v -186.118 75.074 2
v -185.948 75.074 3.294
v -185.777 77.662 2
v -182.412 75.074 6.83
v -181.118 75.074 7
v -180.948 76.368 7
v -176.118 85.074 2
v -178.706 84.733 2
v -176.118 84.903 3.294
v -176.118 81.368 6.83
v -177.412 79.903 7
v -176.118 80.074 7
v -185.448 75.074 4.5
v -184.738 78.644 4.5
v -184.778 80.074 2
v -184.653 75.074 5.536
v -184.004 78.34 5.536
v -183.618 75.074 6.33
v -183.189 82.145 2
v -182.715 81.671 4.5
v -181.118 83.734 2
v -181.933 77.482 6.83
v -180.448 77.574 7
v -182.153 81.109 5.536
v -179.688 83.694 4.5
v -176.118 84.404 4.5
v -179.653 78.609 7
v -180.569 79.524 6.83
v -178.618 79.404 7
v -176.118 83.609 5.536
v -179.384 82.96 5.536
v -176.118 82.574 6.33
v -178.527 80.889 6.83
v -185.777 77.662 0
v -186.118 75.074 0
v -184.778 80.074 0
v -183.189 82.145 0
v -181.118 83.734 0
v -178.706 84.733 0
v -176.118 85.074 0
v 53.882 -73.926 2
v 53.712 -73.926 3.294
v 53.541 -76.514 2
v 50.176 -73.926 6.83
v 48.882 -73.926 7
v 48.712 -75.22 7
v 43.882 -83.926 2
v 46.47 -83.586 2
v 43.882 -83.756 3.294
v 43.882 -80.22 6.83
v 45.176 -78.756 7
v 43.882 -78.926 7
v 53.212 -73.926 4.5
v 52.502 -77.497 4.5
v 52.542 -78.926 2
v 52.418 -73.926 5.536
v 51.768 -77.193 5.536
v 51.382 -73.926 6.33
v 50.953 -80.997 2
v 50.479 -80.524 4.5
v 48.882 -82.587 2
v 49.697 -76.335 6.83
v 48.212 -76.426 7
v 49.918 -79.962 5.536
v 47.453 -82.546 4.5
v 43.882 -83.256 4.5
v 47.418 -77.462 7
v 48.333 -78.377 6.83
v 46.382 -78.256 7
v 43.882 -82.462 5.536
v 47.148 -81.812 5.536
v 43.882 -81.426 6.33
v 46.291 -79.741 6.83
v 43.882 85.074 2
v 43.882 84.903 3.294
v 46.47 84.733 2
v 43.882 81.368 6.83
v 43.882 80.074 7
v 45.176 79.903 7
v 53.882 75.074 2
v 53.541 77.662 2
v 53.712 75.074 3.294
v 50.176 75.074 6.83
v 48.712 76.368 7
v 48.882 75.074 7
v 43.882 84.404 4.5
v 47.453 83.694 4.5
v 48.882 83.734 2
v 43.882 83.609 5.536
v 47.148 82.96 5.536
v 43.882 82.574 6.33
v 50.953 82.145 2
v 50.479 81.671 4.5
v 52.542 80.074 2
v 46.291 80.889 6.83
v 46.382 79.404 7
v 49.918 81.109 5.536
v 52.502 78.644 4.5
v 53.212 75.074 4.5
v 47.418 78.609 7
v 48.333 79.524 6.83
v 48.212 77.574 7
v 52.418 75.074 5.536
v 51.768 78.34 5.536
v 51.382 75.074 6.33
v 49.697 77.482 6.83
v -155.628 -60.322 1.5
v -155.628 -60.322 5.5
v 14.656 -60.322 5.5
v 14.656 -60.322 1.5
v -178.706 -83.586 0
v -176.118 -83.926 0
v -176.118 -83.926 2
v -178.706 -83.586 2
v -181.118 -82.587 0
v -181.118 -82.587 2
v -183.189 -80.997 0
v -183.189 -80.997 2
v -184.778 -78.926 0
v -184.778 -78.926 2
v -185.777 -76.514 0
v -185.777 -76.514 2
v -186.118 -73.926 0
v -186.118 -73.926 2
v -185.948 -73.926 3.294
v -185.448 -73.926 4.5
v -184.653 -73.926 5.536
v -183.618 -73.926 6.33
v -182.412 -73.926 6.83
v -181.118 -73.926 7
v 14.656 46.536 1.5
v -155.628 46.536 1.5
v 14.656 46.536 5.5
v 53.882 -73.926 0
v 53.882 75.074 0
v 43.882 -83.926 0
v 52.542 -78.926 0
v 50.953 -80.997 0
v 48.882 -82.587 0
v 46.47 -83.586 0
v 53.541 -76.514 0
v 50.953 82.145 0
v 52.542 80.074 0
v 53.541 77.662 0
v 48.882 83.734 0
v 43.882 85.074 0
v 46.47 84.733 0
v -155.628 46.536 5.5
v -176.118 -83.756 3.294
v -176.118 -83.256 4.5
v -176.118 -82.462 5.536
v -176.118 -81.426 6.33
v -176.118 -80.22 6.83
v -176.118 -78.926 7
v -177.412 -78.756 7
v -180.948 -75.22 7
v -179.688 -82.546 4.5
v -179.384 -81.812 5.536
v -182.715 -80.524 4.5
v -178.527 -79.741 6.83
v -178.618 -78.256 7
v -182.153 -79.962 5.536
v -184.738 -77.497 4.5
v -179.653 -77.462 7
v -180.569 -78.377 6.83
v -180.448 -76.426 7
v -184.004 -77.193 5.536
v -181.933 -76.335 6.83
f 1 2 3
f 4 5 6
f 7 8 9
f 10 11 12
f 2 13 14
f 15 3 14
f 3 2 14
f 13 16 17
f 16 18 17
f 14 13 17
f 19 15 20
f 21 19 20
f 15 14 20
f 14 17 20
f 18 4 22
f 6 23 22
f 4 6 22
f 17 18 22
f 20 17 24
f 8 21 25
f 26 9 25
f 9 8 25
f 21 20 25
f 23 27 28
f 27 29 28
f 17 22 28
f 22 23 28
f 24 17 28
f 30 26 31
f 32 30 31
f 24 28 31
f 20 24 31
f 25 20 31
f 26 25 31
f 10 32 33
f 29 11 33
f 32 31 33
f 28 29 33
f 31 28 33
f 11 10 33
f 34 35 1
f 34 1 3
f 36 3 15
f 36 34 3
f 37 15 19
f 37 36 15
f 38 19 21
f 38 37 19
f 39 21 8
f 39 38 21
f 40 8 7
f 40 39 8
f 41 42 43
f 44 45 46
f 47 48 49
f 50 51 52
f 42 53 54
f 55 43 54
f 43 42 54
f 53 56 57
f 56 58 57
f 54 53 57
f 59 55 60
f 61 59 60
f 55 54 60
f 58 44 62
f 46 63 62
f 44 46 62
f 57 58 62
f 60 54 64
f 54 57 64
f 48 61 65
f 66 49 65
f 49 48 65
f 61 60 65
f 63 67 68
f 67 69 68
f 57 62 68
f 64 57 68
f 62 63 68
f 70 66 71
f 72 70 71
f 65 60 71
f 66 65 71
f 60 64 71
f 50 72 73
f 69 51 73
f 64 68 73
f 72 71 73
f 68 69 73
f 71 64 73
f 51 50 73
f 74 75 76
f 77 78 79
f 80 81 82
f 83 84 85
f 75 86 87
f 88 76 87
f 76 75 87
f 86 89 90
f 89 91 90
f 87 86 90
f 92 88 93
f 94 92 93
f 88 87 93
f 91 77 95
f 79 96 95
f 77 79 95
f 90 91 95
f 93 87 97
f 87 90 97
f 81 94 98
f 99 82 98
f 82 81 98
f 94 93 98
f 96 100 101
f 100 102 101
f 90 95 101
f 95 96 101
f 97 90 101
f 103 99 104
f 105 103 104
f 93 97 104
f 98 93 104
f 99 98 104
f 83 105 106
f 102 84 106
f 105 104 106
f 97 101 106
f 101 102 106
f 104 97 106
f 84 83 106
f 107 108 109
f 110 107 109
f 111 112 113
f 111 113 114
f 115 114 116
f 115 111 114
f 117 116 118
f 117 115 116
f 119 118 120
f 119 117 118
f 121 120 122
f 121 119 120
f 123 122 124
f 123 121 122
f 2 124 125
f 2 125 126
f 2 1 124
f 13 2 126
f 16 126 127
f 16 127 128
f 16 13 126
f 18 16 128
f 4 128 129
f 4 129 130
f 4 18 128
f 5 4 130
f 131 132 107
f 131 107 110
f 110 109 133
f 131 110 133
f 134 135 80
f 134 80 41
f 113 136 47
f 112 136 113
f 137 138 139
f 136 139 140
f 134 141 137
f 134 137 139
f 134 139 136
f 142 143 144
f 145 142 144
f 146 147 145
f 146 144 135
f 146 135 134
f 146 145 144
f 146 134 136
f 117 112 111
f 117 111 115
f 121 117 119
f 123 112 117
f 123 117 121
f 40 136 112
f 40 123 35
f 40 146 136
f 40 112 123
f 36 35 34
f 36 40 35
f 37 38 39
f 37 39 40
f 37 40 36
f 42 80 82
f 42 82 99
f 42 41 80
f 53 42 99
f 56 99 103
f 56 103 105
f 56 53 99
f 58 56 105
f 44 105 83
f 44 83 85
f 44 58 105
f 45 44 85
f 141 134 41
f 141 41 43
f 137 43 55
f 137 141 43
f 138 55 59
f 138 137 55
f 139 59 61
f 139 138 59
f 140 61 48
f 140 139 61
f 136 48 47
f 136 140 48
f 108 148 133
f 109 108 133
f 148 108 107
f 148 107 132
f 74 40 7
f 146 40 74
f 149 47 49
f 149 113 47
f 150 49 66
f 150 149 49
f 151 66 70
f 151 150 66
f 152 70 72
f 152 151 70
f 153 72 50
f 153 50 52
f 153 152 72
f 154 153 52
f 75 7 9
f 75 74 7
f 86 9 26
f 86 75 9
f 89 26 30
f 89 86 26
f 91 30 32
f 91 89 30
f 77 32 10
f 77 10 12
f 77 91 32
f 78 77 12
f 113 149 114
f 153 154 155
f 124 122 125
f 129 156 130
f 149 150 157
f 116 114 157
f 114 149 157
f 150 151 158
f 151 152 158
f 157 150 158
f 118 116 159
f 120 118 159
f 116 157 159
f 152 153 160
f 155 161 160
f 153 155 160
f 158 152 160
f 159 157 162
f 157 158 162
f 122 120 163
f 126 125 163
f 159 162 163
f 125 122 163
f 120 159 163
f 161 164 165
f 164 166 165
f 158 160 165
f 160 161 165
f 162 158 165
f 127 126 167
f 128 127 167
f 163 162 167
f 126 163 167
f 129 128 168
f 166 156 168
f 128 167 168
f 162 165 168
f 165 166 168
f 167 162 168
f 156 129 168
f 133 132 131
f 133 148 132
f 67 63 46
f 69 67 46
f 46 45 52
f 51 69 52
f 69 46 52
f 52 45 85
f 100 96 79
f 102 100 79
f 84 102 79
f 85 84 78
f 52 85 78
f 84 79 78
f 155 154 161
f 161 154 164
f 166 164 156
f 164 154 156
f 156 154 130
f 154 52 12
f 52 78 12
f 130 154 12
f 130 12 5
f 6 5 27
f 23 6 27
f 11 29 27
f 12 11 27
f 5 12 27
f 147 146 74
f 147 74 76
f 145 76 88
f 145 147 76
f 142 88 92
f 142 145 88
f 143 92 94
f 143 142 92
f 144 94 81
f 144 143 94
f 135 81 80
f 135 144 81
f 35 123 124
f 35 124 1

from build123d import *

# Parameters (mm, degrees)
BOSS_EXTRUDE1_DEPTH = 7
FILLET2_R           = 5
SKETCH2_W           = 170.284513749
SKETCH2_H           = 106.858227508
CUT_EXTRUDE1_DEPTH  = 2


with BuildPart() as part:
    # Sketch1 → Boss-Extrude1 (new body)
    with BuildSketch(Plane.XY):
        with BuildLine():
            Line((-176.117936118, 85.073710074), (43.882063882, 85.073710074))
            ThreePointArc((43.882063882, 85.073710074), (50.953131694, 82.144777886), (53.882063882, 75.073710074))
            Line((53.882063882, 75.073710074), (53.882063882, -73.926289926))
            ThreePointArc((53.882063882, -73.926289926), (50.953131694, -80.997357738), (43.882063882, -83.926289926))
            Line((43.882063882, -83.926289926), (-176.117936118, -83.926289926))
            ThreePointArc((-176.117936118, -83.926289926), (-183.18900393, -80.997357738), (-186.117936118, -73.926289926))
            Line((-186.117936118, -73.926289926), (-186.117936118, 75.073710074))
            ThreePointArc((-186.117936118, 75.073710074), (-183.18900393, 82.144777886), (-176.117936118, 85.073710074))
        make_face()
    extrude(amount=BOSS_EXTRUDE1_DEPTH)

    # Fillet2
    fillet2_edges = [part.edges().sort_by_distance(p)[0] for p in [
        (-183.18900393, -80.997357738, 7),
        (-66.117936118, -83.926289926, 7),
        (50.953131694, -80.997357738, 7),
        (53.882063882, 0.573710074, 7),
        (50.953131694, 82.144777886, 7),
        (-66.117936118, 85.073710074, 7),
        (-183.18900393, 82.144777886, 7),
        (-186.117936118, 0.573710074, 7),
    ]]
    fillet(fillet2_edges, radius=FILLET2_R)

    # Sketch2 → Cut-Extrude1 (cut, symmetric)
    with BuildSketch(Plane.XY.offset(3.5)):
        with Locations((-70.48620655, -6.89321053)):
            Rectangle(SKETCH2_W, SKETCH2_H)
    extrude(amount=CUT_EXTRUDE1_DEPTH, both=True, mode=Mode.SUBTRACT)


solid = part.part
